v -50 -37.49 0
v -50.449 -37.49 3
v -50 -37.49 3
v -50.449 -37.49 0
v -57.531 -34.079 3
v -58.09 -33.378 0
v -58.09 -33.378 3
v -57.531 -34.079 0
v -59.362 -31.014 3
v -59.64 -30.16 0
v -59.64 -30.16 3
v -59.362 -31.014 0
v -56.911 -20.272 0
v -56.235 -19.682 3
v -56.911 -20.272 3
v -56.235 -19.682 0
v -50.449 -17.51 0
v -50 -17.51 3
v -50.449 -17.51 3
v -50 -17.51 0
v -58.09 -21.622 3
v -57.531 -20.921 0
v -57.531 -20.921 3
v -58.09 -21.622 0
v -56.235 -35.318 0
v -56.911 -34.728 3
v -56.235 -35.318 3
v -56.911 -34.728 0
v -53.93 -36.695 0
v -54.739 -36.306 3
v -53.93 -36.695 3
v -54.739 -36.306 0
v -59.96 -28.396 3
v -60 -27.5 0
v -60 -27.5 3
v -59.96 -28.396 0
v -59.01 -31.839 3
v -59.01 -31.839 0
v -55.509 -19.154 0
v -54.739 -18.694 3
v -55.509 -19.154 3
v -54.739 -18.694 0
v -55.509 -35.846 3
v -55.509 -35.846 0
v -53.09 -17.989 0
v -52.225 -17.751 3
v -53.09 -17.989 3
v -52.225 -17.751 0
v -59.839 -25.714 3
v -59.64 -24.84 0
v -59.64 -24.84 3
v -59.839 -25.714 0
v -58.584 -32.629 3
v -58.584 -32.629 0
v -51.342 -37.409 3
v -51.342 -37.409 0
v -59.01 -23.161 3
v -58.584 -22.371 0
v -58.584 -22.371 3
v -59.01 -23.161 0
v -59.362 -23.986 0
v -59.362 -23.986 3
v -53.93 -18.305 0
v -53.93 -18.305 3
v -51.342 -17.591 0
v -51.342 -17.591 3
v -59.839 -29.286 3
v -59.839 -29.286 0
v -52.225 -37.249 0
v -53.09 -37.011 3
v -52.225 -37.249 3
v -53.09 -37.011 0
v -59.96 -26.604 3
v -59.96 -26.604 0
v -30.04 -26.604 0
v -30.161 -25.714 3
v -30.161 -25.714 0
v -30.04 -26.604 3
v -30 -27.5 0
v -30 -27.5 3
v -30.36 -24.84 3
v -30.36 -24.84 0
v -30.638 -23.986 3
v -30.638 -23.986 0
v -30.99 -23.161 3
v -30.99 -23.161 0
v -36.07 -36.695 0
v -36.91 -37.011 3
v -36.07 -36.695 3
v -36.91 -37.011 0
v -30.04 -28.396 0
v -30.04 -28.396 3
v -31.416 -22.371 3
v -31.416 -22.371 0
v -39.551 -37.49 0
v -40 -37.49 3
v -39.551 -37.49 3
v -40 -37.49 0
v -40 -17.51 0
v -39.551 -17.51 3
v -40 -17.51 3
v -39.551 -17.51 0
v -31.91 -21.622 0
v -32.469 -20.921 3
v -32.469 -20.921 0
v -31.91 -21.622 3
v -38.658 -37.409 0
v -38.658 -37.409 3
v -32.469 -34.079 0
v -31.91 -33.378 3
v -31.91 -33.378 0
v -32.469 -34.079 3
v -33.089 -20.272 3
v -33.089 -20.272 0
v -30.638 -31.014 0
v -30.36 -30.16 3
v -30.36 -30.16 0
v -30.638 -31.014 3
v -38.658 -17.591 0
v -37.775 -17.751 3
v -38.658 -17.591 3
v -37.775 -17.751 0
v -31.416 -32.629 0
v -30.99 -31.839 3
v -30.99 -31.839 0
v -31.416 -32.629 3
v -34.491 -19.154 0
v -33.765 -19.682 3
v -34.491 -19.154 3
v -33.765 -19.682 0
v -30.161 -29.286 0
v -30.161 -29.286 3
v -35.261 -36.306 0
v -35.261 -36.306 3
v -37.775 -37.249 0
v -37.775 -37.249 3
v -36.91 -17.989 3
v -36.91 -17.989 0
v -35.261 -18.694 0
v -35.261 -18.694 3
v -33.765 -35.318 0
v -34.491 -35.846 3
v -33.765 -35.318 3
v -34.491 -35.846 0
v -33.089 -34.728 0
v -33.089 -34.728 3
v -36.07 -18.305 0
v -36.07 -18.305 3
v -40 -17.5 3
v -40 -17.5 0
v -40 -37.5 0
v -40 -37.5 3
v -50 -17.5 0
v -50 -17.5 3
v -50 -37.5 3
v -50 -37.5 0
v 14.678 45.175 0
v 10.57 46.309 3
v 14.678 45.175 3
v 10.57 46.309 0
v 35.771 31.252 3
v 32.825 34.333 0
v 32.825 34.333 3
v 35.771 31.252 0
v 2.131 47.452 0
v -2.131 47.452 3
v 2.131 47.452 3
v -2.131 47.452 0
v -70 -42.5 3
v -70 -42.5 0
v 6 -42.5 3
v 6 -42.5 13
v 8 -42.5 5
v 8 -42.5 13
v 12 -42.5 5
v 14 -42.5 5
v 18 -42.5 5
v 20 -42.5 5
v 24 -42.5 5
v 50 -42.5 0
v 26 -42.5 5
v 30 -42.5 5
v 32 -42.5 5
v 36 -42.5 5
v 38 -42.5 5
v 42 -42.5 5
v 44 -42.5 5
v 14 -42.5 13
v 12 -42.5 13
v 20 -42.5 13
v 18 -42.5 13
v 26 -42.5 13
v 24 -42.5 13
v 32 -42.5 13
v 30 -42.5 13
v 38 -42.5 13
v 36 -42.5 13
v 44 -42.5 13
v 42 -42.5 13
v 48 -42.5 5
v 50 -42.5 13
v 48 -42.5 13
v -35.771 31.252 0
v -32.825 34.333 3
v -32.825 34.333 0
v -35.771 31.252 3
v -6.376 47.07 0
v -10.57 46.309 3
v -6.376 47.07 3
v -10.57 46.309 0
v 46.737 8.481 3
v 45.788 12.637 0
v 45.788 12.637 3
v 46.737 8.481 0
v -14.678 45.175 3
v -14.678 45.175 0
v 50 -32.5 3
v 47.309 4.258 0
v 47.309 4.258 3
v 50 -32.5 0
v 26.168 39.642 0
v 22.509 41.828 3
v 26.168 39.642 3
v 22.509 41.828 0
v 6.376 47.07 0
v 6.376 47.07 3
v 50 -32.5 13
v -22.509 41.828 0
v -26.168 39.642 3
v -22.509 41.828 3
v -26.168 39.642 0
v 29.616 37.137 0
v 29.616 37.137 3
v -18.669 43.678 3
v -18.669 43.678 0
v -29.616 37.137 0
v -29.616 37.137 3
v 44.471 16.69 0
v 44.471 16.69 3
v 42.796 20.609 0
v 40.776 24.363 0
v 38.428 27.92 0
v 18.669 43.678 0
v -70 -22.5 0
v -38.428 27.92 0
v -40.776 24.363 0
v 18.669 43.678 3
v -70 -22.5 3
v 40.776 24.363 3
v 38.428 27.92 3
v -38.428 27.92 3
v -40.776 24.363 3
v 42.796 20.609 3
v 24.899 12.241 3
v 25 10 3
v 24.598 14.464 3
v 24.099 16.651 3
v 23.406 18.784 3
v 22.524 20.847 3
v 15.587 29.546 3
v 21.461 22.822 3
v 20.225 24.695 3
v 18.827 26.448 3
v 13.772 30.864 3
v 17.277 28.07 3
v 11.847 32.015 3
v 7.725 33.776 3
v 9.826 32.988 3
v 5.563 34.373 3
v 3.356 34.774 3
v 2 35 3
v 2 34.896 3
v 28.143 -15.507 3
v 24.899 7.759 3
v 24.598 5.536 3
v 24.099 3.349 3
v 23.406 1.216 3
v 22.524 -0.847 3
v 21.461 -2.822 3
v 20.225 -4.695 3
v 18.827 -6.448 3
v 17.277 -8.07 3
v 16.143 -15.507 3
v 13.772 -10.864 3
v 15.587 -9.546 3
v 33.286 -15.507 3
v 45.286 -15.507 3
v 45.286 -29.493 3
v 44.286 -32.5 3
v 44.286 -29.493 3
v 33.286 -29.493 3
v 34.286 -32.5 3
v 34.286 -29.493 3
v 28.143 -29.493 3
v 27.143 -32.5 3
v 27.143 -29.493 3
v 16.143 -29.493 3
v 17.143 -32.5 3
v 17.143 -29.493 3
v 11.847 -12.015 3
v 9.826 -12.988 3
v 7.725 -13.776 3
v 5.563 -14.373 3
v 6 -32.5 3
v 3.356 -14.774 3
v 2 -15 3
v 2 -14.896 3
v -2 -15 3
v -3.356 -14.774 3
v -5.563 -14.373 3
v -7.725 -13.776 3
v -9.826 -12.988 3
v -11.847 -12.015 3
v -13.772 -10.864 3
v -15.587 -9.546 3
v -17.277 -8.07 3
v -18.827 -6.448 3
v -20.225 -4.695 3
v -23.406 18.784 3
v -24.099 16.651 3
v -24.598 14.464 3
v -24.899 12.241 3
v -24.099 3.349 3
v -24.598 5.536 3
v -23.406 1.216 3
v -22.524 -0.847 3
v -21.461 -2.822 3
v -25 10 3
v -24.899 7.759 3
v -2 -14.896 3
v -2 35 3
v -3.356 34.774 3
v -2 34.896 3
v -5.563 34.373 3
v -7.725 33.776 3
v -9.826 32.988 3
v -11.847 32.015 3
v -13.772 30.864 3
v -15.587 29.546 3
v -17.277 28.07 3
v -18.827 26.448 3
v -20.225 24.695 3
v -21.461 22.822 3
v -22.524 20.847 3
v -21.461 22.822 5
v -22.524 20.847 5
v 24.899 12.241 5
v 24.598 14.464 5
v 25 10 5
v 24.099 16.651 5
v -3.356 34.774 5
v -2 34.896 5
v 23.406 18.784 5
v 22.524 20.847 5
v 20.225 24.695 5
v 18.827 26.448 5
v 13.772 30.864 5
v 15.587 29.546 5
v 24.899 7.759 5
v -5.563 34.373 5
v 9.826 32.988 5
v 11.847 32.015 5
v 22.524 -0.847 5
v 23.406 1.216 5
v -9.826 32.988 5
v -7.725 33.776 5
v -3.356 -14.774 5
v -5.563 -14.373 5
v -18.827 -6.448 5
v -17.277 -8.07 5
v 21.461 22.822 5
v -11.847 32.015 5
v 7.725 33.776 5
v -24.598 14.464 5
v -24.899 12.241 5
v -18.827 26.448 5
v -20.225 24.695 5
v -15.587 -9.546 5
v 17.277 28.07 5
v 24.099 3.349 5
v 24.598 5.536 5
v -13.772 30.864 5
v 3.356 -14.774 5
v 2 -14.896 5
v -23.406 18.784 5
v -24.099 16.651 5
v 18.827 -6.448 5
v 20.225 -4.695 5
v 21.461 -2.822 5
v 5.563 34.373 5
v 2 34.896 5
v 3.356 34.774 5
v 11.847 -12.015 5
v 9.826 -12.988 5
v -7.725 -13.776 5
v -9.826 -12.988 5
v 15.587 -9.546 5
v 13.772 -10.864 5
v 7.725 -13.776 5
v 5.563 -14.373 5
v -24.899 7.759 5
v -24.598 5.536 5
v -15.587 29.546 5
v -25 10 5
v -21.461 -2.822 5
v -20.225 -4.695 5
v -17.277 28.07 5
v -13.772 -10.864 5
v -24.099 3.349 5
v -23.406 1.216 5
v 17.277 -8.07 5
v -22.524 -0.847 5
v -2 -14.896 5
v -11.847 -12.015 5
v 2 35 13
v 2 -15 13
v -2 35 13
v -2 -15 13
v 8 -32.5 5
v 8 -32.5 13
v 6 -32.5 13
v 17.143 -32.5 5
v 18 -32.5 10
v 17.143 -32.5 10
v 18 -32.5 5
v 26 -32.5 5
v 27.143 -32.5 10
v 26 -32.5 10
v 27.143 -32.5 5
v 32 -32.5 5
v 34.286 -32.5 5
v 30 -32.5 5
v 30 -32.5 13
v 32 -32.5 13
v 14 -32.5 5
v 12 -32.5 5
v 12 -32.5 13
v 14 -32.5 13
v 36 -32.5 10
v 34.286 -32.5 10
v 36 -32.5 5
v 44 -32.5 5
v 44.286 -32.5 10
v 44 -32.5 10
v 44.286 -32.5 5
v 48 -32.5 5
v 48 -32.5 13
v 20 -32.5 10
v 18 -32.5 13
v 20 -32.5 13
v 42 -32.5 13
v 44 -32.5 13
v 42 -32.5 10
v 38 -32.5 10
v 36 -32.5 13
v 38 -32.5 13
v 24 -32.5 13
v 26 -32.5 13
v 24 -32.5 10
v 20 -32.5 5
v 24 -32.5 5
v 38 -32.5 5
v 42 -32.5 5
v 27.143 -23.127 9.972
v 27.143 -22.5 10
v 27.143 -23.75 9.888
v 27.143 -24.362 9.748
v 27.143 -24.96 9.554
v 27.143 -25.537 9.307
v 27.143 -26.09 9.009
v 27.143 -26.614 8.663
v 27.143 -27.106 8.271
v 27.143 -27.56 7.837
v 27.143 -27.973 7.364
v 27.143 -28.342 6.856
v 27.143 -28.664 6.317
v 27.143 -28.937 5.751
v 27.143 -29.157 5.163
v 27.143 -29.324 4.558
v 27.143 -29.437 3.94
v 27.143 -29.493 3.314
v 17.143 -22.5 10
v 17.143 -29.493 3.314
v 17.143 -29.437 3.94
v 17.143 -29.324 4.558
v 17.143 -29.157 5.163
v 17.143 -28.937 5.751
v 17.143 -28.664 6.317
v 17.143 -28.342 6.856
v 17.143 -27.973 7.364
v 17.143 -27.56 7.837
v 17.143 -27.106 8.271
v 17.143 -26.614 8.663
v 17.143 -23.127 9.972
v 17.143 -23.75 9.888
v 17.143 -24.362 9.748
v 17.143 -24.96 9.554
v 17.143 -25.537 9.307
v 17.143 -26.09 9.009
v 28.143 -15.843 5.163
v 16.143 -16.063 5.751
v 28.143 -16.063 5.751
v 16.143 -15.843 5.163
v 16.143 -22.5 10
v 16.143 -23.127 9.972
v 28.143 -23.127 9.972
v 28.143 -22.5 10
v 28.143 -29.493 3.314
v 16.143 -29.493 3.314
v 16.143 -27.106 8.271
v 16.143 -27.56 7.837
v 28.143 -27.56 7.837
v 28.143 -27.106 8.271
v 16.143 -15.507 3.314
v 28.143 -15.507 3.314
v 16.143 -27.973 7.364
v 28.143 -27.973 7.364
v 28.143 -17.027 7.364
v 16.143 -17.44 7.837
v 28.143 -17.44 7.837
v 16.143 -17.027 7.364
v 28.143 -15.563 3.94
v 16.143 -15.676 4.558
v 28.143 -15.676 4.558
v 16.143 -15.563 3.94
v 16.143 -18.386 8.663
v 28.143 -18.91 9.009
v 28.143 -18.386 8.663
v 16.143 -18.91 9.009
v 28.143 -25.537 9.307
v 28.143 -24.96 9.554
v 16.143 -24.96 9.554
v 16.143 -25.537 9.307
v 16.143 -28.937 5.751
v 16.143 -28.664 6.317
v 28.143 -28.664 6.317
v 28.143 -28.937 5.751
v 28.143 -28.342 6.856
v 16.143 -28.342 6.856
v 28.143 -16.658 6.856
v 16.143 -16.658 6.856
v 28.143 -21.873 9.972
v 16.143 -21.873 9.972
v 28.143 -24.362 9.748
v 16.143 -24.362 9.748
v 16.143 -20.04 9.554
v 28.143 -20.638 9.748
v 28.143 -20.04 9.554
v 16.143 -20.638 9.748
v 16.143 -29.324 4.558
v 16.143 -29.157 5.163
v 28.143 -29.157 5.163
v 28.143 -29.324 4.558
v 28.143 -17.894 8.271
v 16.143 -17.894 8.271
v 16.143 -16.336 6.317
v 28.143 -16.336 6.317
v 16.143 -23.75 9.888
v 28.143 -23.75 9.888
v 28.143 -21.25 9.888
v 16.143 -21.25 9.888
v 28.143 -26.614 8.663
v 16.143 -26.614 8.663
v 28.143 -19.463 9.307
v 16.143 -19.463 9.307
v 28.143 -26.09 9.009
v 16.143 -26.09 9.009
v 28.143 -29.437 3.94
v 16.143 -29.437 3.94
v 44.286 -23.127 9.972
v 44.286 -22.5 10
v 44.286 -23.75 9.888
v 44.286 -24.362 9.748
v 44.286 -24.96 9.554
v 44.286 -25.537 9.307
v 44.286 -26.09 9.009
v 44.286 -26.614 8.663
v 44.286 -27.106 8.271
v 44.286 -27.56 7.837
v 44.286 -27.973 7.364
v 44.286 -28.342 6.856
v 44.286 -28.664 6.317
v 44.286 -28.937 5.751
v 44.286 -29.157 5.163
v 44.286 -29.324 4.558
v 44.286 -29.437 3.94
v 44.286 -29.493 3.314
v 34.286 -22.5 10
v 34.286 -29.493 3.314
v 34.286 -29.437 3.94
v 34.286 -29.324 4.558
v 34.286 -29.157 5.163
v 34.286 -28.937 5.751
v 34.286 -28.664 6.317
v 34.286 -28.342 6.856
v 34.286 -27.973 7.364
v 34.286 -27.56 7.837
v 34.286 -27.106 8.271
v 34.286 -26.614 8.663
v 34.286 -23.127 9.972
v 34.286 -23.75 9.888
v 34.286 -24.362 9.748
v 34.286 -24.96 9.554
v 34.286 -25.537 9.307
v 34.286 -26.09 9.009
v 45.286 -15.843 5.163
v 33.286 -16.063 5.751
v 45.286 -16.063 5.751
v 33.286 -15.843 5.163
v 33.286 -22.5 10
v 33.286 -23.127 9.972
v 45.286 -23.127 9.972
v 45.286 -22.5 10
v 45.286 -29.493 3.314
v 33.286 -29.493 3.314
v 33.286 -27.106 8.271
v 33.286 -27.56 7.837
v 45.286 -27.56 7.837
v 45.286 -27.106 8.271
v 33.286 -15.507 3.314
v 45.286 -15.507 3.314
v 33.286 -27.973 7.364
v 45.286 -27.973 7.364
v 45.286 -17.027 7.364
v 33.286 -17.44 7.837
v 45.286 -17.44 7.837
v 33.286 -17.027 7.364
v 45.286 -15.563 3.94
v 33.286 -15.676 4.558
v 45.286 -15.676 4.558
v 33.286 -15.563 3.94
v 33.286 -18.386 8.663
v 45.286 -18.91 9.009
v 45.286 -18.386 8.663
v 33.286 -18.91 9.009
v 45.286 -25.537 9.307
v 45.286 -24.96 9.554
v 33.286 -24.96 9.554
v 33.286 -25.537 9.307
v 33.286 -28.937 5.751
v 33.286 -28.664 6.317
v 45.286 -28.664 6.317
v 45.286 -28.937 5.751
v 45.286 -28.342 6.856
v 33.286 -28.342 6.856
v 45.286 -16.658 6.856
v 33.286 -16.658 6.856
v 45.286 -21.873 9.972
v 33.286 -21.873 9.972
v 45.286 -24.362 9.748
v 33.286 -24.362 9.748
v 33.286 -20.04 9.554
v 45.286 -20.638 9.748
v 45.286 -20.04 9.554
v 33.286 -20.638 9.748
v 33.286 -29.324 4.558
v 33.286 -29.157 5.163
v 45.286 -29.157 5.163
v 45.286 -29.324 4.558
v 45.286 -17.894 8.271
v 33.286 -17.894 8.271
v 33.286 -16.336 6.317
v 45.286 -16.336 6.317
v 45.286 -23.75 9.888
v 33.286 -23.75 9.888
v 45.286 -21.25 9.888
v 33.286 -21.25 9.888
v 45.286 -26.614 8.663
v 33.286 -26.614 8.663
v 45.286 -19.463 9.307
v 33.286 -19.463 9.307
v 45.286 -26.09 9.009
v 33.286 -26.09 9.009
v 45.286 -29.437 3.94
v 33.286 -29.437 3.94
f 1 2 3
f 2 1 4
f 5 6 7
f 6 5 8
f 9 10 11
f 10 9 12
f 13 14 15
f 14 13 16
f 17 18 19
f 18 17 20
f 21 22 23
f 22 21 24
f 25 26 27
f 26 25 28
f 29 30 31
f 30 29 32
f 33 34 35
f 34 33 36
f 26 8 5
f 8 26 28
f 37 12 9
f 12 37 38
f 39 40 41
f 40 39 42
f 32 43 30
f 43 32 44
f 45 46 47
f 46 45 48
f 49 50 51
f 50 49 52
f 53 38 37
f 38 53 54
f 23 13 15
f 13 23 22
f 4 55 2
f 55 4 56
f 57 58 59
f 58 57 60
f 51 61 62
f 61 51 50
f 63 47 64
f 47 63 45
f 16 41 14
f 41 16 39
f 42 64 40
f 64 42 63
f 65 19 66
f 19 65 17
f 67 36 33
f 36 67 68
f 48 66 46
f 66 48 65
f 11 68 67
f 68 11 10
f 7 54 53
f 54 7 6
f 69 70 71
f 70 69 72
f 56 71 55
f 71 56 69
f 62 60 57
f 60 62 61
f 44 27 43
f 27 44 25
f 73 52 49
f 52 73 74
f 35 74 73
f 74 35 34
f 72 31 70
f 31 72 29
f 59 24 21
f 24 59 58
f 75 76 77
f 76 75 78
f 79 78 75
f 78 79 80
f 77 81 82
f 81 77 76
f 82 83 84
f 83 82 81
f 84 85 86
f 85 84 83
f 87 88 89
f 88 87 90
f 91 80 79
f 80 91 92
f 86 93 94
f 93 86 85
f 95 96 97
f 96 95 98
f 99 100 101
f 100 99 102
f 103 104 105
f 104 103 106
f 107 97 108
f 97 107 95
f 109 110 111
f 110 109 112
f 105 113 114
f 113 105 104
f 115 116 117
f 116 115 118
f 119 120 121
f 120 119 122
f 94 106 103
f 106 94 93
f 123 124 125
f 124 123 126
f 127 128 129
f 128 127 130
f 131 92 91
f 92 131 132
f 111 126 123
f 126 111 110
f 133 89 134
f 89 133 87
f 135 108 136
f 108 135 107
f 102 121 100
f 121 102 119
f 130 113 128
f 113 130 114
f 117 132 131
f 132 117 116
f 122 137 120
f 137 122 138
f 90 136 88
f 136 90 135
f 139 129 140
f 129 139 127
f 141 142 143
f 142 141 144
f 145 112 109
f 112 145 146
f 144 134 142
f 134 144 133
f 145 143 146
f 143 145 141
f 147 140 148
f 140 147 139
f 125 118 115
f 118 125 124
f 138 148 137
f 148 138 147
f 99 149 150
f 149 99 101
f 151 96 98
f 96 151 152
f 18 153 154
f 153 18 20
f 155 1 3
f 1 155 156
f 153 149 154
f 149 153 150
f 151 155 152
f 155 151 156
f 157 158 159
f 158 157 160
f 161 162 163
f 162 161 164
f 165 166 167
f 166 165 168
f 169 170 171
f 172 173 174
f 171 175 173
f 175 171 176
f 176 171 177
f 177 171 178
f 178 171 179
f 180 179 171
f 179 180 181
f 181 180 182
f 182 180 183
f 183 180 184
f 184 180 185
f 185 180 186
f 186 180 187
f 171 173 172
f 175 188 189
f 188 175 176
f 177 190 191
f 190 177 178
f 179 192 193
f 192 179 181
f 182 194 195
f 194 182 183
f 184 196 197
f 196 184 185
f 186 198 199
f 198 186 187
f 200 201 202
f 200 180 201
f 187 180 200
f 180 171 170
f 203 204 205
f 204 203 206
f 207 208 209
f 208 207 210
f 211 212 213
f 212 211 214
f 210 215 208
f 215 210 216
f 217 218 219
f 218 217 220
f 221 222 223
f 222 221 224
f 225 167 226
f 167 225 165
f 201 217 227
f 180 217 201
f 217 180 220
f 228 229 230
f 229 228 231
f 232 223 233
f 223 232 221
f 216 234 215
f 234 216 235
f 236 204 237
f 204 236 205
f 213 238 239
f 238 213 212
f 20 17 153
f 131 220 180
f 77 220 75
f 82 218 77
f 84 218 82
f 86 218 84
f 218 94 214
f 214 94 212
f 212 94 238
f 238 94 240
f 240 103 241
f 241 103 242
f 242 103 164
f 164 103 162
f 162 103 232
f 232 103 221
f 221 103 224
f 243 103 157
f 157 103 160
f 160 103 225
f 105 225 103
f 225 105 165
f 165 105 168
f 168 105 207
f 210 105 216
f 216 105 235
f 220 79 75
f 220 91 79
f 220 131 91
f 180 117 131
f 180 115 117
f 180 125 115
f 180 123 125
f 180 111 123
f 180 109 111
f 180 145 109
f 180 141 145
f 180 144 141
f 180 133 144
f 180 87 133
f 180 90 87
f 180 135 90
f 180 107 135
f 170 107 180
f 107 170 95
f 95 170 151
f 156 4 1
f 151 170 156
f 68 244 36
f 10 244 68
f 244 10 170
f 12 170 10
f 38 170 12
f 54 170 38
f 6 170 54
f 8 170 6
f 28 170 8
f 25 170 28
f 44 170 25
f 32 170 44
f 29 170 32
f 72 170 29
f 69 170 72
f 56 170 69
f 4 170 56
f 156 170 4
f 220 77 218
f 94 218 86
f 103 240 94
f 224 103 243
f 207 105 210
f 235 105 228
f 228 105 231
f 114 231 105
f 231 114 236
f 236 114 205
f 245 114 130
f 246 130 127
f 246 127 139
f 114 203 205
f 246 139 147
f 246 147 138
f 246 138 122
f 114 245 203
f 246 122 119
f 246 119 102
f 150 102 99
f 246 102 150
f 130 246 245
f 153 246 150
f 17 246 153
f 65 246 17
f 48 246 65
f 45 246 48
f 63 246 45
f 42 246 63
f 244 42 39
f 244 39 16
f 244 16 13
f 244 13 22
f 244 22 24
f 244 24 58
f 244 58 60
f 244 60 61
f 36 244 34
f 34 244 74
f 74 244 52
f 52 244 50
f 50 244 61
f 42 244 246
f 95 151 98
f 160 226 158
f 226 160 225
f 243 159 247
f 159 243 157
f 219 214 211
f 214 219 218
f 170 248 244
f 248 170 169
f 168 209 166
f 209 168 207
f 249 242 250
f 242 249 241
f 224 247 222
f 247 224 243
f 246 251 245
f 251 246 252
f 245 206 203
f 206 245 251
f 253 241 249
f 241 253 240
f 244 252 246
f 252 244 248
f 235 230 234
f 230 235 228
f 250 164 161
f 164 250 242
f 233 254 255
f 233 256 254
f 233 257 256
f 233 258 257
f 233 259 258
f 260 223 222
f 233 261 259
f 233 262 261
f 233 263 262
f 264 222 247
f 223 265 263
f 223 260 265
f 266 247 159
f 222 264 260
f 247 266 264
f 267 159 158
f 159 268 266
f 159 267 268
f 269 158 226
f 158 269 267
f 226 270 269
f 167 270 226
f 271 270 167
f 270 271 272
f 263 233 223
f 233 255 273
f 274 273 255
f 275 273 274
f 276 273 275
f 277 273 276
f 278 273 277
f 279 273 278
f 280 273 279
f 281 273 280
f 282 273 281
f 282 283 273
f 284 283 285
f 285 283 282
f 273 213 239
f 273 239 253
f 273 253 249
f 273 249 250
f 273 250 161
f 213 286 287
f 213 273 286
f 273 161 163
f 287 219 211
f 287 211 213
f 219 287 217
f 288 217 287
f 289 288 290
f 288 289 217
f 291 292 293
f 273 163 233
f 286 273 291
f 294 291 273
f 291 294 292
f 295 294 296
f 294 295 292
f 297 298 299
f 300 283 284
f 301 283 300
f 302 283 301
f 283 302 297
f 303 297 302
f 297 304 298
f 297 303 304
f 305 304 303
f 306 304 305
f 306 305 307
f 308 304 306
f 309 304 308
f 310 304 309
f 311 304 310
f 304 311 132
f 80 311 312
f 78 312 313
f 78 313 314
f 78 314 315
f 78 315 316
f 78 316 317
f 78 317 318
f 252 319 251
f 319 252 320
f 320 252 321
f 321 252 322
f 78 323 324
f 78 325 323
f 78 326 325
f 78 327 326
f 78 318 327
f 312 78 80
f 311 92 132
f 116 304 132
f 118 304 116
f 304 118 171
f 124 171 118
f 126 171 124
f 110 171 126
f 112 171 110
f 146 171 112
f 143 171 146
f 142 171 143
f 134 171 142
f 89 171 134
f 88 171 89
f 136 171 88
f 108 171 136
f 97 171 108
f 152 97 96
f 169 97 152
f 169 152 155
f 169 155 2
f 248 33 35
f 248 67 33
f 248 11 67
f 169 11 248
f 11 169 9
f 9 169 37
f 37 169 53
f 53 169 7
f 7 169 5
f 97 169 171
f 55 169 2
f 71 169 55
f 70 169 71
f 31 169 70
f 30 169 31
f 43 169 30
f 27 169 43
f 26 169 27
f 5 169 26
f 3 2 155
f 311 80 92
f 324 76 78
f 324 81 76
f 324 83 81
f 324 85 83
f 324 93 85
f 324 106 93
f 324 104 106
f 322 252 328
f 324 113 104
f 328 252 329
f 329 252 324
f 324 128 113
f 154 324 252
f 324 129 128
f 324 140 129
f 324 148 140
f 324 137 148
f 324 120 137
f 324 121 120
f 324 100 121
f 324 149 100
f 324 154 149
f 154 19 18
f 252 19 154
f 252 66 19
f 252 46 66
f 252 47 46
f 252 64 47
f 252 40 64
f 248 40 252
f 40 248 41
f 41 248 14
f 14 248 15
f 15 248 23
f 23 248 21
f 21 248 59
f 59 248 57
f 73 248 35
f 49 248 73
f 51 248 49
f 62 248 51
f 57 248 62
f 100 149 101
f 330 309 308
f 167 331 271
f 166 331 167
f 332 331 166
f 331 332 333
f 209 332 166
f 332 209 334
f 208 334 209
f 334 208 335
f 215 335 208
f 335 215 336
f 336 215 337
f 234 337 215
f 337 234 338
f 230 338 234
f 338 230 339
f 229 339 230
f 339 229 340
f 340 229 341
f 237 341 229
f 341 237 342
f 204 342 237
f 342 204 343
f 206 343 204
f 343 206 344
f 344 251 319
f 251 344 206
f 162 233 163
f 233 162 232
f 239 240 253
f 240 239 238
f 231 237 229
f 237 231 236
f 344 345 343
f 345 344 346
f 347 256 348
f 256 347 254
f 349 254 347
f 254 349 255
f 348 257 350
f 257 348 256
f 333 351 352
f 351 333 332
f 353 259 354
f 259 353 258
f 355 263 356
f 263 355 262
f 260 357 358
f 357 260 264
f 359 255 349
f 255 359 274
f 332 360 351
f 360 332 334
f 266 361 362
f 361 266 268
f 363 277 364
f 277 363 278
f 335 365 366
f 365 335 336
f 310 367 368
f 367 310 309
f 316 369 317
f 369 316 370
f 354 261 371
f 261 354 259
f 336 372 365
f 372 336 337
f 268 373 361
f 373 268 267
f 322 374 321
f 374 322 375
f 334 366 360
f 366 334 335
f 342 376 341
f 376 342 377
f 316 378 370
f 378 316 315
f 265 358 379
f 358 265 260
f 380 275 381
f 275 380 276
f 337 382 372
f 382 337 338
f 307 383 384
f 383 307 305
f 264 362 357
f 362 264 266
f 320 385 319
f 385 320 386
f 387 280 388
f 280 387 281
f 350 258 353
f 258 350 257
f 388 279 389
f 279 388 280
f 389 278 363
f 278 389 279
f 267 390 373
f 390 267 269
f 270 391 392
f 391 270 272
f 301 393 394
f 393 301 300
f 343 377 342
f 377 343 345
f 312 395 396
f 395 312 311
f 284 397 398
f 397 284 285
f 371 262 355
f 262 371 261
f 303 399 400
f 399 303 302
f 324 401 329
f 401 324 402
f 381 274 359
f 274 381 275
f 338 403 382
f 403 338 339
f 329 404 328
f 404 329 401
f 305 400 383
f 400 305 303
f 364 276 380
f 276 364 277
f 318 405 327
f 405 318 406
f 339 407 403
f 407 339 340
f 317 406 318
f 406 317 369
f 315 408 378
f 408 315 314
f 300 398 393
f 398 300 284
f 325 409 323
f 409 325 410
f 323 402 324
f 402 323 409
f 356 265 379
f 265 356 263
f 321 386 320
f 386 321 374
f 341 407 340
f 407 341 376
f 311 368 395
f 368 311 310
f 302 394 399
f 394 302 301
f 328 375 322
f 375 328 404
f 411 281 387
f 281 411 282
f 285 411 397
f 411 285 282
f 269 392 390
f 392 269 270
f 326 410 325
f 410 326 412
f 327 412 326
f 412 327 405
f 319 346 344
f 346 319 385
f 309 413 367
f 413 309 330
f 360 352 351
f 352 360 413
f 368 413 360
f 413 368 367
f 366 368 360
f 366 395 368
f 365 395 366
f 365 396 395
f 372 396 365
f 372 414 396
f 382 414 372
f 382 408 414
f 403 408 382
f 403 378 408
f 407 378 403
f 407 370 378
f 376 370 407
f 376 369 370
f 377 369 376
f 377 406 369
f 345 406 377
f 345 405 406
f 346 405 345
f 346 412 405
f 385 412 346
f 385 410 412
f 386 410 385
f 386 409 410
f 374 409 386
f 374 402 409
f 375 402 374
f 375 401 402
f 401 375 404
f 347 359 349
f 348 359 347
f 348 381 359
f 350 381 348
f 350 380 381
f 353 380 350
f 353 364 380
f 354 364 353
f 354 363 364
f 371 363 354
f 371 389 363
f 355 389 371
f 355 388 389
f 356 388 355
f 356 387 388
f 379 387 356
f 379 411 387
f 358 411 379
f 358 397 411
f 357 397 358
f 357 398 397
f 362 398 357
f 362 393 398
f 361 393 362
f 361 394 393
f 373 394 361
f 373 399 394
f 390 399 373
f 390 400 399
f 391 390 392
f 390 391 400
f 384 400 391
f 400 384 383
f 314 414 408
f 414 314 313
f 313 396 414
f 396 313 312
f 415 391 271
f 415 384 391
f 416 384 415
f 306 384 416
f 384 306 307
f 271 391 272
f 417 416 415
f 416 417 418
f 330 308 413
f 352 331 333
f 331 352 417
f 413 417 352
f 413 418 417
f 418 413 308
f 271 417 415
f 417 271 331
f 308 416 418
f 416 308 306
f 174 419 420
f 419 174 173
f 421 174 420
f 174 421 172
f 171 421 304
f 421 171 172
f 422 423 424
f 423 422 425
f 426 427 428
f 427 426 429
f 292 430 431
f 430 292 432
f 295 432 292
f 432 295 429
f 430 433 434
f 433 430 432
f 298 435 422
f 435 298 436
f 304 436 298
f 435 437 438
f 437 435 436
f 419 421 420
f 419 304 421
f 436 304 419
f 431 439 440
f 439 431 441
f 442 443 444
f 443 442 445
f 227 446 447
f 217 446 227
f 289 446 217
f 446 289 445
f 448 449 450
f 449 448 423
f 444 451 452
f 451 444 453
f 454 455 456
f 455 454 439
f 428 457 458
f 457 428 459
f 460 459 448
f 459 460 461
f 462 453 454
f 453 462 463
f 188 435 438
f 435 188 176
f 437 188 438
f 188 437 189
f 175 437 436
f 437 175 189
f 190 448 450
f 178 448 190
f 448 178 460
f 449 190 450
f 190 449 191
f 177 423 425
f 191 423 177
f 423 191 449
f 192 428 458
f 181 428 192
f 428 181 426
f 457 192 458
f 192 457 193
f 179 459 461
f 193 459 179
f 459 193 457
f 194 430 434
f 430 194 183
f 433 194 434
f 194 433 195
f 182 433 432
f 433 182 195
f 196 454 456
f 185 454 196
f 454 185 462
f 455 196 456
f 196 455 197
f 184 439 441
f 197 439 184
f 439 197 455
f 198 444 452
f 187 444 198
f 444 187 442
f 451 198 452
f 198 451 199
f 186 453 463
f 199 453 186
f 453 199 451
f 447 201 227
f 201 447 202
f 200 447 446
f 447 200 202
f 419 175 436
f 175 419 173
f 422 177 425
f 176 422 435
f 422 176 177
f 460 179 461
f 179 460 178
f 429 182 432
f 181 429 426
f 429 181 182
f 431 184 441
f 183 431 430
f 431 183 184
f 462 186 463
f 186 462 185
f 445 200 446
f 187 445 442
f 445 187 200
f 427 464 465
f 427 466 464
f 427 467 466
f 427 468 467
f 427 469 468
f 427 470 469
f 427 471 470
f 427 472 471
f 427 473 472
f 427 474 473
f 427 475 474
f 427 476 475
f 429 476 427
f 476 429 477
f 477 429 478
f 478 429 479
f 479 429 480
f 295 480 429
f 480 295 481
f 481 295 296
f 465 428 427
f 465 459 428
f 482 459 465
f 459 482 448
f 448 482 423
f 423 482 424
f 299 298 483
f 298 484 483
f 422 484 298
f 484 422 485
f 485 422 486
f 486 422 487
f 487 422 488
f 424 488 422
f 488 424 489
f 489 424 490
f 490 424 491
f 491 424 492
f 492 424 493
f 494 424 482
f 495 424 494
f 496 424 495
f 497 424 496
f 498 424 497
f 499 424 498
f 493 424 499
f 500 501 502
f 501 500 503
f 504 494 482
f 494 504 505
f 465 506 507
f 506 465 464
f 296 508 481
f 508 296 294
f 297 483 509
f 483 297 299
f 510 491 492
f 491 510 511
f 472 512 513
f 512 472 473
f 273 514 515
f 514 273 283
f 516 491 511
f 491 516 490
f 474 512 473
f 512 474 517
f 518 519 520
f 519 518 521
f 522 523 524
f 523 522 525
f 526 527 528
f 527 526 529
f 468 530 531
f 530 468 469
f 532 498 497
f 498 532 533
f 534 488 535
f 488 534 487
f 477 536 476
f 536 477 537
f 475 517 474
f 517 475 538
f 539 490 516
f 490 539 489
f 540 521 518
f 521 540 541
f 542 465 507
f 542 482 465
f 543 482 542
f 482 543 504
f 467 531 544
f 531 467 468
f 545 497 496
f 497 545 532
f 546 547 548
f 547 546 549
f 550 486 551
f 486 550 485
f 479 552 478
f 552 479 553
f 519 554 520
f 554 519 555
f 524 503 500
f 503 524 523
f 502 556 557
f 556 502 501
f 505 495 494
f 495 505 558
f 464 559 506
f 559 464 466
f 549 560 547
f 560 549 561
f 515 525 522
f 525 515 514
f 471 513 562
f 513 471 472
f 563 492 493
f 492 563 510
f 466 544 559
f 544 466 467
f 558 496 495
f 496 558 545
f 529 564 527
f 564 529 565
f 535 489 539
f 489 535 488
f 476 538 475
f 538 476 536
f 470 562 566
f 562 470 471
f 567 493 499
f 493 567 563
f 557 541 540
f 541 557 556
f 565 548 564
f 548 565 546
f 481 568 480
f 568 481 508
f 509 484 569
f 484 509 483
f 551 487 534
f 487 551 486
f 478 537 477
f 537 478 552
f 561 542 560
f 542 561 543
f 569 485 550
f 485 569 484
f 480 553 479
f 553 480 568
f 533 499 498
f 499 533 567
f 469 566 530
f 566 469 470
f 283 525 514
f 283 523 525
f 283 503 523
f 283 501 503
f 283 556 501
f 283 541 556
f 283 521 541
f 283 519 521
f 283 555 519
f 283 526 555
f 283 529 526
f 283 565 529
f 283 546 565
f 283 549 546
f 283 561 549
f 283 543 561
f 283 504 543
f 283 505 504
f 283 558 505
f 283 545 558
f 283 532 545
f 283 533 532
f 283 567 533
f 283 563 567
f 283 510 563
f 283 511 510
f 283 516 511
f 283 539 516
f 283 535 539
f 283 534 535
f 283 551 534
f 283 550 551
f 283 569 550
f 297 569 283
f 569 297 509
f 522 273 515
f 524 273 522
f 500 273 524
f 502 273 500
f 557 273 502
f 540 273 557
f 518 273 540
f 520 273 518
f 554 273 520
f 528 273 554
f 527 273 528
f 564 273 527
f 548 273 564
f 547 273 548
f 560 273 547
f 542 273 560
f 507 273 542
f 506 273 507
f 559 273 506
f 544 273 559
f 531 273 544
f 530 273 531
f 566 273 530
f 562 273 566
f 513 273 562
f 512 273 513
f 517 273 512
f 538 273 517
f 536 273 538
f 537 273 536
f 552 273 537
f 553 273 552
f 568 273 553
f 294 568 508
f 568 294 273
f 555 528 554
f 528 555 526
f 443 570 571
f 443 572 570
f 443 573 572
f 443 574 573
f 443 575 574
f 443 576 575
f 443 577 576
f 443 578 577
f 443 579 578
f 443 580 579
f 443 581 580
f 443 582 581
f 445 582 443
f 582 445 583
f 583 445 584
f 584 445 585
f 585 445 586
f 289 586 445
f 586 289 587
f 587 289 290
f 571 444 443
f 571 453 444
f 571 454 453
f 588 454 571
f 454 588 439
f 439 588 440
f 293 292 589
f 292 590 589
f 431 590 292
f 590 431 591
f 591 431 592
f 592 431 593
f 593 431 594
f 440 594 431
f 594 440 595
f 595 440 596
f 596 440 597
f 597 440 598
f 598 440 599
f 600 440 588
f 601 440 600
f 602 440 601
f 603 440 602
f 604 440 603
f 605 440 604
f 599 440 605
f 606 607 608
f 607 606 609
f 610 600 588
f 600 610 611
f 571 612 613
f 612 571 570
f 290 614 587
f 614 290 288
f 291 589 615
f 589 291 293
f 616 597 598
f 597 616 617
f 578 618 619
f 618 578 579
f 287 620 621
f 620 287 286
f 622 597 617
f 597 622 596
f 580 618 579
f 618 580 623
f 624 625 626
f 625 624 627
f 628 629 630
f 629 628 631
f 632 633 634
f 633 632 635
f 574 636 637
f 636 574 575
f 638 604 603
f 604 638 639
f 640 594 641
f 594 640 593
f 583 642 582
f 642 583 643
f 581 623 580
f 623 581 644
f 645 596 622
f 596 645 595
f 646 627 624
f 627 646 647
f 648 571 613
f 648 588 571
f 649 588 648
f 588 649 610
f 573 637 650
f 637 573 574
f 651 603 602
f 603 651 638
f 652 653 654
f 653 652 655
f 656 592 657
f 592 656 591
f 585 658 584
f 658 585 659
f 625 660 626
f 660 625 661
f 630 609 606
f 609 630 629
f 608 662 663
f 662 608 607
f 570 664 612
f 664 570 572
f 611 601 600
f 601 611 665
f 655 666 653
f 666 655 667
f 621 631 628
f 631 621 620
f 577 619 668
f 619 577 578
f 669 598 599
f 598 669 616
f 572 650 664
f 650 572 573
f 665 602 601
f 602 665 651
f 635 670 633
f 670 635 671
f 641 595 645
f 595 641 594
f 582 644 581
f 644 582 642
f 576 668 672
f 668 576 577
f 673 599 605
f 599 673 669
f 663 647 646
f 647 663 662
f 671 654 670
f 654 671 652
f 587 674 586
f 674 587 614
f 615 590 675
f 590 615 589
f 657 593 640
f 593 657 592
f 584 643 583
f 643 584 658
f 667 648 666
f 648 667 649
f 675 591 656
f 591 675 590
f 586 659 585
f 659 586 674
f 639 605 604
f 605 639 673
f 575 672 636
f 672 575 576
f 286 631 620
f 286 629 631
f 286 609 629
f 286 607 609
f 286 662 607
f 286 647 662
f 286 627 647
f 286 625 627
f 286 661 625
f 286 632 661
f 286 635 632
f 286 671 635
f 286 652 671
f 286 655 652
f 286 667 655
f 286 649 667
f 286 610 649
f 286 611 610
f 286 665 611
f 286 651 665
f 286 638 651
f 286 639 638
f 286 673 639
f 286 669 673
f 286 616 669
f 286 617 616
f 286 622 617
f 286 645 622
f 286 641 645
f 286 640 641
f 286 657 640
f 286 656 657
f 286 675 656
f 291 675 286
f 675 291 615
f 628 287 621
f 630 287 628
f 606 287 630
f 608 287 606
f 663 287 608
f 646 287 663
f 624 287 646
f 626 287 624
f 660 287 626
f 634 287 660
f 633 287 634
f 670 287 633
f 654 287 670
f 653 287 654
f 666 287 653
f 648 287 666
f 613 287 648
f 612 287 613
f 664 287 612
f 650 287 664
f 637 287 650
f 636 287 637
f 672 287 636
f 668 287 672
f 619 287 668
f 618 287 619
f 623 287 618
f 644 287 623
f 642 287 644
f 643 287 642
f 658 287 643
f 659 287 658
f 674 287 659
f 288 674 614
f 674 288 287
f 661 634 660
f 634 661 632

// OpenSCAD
/*
    Scout Trooper tank topper
*/

$fn=70;

difference(){
    
    // base board
    hull(){
        difference(){
            cylinder(r=95/2,h=3);
            translate([-(95/2),-(95/2),-1]){
                cube([95,95/2,5]);
            }
        }
        
        // base bar
        translate([-(120/2)-10,-90+(95/2),0]){
            cube([120,10,3]);
        }
        
        // left bar
        translate([-(120/2)-10,-90+(95/2),0]){
            cube([20,20,3]);
        }
    }
    
    // button hole
    translate([-(120/2)+10,-(95/2)+20,-1]){
        cylinder(r=10,h=5);
        translate([10,0,0]){
            cylinder(r=10,h=5);
        }
        translate([0,-10,0]){
            cube([10,20,5]);
        }
    }
}

// knob
translate([0,10,3]){
    cylinder(r=50/2,h=2);
    translate([-2,-25,0]){
        cube([4,50,10]);
    }
}

// heatsink
translate([0,-(95/2)+5,3]){
    translate([6,0,0]){
        cube([44,10,2]);
    }
    
    for(a = [1:8]){
        translate([6*a,0,0]){
            cube([2,10,10]);
        }
    }   
}

// boxes
difference(){
    union(){
        translate([120/7,-(95/2)+15,3]){
            cube([10,10,7]);
            translate([-1,10,0]){
                rotate([0,90,0]){
                    cylinder(r=7,h=12);
                }
            }
        }
        translate([120/3.5,-(95/2)+15,3]){
            cube([10,10,7]);
            translate([-1,10,0]){
                rotate([0,90,0]){
                    cylinder(r=7,h=12);
                }
            }
        }
    }
    
    translate([0,-50,-5]){
        cube([50,50,5]);
    }
}
    
